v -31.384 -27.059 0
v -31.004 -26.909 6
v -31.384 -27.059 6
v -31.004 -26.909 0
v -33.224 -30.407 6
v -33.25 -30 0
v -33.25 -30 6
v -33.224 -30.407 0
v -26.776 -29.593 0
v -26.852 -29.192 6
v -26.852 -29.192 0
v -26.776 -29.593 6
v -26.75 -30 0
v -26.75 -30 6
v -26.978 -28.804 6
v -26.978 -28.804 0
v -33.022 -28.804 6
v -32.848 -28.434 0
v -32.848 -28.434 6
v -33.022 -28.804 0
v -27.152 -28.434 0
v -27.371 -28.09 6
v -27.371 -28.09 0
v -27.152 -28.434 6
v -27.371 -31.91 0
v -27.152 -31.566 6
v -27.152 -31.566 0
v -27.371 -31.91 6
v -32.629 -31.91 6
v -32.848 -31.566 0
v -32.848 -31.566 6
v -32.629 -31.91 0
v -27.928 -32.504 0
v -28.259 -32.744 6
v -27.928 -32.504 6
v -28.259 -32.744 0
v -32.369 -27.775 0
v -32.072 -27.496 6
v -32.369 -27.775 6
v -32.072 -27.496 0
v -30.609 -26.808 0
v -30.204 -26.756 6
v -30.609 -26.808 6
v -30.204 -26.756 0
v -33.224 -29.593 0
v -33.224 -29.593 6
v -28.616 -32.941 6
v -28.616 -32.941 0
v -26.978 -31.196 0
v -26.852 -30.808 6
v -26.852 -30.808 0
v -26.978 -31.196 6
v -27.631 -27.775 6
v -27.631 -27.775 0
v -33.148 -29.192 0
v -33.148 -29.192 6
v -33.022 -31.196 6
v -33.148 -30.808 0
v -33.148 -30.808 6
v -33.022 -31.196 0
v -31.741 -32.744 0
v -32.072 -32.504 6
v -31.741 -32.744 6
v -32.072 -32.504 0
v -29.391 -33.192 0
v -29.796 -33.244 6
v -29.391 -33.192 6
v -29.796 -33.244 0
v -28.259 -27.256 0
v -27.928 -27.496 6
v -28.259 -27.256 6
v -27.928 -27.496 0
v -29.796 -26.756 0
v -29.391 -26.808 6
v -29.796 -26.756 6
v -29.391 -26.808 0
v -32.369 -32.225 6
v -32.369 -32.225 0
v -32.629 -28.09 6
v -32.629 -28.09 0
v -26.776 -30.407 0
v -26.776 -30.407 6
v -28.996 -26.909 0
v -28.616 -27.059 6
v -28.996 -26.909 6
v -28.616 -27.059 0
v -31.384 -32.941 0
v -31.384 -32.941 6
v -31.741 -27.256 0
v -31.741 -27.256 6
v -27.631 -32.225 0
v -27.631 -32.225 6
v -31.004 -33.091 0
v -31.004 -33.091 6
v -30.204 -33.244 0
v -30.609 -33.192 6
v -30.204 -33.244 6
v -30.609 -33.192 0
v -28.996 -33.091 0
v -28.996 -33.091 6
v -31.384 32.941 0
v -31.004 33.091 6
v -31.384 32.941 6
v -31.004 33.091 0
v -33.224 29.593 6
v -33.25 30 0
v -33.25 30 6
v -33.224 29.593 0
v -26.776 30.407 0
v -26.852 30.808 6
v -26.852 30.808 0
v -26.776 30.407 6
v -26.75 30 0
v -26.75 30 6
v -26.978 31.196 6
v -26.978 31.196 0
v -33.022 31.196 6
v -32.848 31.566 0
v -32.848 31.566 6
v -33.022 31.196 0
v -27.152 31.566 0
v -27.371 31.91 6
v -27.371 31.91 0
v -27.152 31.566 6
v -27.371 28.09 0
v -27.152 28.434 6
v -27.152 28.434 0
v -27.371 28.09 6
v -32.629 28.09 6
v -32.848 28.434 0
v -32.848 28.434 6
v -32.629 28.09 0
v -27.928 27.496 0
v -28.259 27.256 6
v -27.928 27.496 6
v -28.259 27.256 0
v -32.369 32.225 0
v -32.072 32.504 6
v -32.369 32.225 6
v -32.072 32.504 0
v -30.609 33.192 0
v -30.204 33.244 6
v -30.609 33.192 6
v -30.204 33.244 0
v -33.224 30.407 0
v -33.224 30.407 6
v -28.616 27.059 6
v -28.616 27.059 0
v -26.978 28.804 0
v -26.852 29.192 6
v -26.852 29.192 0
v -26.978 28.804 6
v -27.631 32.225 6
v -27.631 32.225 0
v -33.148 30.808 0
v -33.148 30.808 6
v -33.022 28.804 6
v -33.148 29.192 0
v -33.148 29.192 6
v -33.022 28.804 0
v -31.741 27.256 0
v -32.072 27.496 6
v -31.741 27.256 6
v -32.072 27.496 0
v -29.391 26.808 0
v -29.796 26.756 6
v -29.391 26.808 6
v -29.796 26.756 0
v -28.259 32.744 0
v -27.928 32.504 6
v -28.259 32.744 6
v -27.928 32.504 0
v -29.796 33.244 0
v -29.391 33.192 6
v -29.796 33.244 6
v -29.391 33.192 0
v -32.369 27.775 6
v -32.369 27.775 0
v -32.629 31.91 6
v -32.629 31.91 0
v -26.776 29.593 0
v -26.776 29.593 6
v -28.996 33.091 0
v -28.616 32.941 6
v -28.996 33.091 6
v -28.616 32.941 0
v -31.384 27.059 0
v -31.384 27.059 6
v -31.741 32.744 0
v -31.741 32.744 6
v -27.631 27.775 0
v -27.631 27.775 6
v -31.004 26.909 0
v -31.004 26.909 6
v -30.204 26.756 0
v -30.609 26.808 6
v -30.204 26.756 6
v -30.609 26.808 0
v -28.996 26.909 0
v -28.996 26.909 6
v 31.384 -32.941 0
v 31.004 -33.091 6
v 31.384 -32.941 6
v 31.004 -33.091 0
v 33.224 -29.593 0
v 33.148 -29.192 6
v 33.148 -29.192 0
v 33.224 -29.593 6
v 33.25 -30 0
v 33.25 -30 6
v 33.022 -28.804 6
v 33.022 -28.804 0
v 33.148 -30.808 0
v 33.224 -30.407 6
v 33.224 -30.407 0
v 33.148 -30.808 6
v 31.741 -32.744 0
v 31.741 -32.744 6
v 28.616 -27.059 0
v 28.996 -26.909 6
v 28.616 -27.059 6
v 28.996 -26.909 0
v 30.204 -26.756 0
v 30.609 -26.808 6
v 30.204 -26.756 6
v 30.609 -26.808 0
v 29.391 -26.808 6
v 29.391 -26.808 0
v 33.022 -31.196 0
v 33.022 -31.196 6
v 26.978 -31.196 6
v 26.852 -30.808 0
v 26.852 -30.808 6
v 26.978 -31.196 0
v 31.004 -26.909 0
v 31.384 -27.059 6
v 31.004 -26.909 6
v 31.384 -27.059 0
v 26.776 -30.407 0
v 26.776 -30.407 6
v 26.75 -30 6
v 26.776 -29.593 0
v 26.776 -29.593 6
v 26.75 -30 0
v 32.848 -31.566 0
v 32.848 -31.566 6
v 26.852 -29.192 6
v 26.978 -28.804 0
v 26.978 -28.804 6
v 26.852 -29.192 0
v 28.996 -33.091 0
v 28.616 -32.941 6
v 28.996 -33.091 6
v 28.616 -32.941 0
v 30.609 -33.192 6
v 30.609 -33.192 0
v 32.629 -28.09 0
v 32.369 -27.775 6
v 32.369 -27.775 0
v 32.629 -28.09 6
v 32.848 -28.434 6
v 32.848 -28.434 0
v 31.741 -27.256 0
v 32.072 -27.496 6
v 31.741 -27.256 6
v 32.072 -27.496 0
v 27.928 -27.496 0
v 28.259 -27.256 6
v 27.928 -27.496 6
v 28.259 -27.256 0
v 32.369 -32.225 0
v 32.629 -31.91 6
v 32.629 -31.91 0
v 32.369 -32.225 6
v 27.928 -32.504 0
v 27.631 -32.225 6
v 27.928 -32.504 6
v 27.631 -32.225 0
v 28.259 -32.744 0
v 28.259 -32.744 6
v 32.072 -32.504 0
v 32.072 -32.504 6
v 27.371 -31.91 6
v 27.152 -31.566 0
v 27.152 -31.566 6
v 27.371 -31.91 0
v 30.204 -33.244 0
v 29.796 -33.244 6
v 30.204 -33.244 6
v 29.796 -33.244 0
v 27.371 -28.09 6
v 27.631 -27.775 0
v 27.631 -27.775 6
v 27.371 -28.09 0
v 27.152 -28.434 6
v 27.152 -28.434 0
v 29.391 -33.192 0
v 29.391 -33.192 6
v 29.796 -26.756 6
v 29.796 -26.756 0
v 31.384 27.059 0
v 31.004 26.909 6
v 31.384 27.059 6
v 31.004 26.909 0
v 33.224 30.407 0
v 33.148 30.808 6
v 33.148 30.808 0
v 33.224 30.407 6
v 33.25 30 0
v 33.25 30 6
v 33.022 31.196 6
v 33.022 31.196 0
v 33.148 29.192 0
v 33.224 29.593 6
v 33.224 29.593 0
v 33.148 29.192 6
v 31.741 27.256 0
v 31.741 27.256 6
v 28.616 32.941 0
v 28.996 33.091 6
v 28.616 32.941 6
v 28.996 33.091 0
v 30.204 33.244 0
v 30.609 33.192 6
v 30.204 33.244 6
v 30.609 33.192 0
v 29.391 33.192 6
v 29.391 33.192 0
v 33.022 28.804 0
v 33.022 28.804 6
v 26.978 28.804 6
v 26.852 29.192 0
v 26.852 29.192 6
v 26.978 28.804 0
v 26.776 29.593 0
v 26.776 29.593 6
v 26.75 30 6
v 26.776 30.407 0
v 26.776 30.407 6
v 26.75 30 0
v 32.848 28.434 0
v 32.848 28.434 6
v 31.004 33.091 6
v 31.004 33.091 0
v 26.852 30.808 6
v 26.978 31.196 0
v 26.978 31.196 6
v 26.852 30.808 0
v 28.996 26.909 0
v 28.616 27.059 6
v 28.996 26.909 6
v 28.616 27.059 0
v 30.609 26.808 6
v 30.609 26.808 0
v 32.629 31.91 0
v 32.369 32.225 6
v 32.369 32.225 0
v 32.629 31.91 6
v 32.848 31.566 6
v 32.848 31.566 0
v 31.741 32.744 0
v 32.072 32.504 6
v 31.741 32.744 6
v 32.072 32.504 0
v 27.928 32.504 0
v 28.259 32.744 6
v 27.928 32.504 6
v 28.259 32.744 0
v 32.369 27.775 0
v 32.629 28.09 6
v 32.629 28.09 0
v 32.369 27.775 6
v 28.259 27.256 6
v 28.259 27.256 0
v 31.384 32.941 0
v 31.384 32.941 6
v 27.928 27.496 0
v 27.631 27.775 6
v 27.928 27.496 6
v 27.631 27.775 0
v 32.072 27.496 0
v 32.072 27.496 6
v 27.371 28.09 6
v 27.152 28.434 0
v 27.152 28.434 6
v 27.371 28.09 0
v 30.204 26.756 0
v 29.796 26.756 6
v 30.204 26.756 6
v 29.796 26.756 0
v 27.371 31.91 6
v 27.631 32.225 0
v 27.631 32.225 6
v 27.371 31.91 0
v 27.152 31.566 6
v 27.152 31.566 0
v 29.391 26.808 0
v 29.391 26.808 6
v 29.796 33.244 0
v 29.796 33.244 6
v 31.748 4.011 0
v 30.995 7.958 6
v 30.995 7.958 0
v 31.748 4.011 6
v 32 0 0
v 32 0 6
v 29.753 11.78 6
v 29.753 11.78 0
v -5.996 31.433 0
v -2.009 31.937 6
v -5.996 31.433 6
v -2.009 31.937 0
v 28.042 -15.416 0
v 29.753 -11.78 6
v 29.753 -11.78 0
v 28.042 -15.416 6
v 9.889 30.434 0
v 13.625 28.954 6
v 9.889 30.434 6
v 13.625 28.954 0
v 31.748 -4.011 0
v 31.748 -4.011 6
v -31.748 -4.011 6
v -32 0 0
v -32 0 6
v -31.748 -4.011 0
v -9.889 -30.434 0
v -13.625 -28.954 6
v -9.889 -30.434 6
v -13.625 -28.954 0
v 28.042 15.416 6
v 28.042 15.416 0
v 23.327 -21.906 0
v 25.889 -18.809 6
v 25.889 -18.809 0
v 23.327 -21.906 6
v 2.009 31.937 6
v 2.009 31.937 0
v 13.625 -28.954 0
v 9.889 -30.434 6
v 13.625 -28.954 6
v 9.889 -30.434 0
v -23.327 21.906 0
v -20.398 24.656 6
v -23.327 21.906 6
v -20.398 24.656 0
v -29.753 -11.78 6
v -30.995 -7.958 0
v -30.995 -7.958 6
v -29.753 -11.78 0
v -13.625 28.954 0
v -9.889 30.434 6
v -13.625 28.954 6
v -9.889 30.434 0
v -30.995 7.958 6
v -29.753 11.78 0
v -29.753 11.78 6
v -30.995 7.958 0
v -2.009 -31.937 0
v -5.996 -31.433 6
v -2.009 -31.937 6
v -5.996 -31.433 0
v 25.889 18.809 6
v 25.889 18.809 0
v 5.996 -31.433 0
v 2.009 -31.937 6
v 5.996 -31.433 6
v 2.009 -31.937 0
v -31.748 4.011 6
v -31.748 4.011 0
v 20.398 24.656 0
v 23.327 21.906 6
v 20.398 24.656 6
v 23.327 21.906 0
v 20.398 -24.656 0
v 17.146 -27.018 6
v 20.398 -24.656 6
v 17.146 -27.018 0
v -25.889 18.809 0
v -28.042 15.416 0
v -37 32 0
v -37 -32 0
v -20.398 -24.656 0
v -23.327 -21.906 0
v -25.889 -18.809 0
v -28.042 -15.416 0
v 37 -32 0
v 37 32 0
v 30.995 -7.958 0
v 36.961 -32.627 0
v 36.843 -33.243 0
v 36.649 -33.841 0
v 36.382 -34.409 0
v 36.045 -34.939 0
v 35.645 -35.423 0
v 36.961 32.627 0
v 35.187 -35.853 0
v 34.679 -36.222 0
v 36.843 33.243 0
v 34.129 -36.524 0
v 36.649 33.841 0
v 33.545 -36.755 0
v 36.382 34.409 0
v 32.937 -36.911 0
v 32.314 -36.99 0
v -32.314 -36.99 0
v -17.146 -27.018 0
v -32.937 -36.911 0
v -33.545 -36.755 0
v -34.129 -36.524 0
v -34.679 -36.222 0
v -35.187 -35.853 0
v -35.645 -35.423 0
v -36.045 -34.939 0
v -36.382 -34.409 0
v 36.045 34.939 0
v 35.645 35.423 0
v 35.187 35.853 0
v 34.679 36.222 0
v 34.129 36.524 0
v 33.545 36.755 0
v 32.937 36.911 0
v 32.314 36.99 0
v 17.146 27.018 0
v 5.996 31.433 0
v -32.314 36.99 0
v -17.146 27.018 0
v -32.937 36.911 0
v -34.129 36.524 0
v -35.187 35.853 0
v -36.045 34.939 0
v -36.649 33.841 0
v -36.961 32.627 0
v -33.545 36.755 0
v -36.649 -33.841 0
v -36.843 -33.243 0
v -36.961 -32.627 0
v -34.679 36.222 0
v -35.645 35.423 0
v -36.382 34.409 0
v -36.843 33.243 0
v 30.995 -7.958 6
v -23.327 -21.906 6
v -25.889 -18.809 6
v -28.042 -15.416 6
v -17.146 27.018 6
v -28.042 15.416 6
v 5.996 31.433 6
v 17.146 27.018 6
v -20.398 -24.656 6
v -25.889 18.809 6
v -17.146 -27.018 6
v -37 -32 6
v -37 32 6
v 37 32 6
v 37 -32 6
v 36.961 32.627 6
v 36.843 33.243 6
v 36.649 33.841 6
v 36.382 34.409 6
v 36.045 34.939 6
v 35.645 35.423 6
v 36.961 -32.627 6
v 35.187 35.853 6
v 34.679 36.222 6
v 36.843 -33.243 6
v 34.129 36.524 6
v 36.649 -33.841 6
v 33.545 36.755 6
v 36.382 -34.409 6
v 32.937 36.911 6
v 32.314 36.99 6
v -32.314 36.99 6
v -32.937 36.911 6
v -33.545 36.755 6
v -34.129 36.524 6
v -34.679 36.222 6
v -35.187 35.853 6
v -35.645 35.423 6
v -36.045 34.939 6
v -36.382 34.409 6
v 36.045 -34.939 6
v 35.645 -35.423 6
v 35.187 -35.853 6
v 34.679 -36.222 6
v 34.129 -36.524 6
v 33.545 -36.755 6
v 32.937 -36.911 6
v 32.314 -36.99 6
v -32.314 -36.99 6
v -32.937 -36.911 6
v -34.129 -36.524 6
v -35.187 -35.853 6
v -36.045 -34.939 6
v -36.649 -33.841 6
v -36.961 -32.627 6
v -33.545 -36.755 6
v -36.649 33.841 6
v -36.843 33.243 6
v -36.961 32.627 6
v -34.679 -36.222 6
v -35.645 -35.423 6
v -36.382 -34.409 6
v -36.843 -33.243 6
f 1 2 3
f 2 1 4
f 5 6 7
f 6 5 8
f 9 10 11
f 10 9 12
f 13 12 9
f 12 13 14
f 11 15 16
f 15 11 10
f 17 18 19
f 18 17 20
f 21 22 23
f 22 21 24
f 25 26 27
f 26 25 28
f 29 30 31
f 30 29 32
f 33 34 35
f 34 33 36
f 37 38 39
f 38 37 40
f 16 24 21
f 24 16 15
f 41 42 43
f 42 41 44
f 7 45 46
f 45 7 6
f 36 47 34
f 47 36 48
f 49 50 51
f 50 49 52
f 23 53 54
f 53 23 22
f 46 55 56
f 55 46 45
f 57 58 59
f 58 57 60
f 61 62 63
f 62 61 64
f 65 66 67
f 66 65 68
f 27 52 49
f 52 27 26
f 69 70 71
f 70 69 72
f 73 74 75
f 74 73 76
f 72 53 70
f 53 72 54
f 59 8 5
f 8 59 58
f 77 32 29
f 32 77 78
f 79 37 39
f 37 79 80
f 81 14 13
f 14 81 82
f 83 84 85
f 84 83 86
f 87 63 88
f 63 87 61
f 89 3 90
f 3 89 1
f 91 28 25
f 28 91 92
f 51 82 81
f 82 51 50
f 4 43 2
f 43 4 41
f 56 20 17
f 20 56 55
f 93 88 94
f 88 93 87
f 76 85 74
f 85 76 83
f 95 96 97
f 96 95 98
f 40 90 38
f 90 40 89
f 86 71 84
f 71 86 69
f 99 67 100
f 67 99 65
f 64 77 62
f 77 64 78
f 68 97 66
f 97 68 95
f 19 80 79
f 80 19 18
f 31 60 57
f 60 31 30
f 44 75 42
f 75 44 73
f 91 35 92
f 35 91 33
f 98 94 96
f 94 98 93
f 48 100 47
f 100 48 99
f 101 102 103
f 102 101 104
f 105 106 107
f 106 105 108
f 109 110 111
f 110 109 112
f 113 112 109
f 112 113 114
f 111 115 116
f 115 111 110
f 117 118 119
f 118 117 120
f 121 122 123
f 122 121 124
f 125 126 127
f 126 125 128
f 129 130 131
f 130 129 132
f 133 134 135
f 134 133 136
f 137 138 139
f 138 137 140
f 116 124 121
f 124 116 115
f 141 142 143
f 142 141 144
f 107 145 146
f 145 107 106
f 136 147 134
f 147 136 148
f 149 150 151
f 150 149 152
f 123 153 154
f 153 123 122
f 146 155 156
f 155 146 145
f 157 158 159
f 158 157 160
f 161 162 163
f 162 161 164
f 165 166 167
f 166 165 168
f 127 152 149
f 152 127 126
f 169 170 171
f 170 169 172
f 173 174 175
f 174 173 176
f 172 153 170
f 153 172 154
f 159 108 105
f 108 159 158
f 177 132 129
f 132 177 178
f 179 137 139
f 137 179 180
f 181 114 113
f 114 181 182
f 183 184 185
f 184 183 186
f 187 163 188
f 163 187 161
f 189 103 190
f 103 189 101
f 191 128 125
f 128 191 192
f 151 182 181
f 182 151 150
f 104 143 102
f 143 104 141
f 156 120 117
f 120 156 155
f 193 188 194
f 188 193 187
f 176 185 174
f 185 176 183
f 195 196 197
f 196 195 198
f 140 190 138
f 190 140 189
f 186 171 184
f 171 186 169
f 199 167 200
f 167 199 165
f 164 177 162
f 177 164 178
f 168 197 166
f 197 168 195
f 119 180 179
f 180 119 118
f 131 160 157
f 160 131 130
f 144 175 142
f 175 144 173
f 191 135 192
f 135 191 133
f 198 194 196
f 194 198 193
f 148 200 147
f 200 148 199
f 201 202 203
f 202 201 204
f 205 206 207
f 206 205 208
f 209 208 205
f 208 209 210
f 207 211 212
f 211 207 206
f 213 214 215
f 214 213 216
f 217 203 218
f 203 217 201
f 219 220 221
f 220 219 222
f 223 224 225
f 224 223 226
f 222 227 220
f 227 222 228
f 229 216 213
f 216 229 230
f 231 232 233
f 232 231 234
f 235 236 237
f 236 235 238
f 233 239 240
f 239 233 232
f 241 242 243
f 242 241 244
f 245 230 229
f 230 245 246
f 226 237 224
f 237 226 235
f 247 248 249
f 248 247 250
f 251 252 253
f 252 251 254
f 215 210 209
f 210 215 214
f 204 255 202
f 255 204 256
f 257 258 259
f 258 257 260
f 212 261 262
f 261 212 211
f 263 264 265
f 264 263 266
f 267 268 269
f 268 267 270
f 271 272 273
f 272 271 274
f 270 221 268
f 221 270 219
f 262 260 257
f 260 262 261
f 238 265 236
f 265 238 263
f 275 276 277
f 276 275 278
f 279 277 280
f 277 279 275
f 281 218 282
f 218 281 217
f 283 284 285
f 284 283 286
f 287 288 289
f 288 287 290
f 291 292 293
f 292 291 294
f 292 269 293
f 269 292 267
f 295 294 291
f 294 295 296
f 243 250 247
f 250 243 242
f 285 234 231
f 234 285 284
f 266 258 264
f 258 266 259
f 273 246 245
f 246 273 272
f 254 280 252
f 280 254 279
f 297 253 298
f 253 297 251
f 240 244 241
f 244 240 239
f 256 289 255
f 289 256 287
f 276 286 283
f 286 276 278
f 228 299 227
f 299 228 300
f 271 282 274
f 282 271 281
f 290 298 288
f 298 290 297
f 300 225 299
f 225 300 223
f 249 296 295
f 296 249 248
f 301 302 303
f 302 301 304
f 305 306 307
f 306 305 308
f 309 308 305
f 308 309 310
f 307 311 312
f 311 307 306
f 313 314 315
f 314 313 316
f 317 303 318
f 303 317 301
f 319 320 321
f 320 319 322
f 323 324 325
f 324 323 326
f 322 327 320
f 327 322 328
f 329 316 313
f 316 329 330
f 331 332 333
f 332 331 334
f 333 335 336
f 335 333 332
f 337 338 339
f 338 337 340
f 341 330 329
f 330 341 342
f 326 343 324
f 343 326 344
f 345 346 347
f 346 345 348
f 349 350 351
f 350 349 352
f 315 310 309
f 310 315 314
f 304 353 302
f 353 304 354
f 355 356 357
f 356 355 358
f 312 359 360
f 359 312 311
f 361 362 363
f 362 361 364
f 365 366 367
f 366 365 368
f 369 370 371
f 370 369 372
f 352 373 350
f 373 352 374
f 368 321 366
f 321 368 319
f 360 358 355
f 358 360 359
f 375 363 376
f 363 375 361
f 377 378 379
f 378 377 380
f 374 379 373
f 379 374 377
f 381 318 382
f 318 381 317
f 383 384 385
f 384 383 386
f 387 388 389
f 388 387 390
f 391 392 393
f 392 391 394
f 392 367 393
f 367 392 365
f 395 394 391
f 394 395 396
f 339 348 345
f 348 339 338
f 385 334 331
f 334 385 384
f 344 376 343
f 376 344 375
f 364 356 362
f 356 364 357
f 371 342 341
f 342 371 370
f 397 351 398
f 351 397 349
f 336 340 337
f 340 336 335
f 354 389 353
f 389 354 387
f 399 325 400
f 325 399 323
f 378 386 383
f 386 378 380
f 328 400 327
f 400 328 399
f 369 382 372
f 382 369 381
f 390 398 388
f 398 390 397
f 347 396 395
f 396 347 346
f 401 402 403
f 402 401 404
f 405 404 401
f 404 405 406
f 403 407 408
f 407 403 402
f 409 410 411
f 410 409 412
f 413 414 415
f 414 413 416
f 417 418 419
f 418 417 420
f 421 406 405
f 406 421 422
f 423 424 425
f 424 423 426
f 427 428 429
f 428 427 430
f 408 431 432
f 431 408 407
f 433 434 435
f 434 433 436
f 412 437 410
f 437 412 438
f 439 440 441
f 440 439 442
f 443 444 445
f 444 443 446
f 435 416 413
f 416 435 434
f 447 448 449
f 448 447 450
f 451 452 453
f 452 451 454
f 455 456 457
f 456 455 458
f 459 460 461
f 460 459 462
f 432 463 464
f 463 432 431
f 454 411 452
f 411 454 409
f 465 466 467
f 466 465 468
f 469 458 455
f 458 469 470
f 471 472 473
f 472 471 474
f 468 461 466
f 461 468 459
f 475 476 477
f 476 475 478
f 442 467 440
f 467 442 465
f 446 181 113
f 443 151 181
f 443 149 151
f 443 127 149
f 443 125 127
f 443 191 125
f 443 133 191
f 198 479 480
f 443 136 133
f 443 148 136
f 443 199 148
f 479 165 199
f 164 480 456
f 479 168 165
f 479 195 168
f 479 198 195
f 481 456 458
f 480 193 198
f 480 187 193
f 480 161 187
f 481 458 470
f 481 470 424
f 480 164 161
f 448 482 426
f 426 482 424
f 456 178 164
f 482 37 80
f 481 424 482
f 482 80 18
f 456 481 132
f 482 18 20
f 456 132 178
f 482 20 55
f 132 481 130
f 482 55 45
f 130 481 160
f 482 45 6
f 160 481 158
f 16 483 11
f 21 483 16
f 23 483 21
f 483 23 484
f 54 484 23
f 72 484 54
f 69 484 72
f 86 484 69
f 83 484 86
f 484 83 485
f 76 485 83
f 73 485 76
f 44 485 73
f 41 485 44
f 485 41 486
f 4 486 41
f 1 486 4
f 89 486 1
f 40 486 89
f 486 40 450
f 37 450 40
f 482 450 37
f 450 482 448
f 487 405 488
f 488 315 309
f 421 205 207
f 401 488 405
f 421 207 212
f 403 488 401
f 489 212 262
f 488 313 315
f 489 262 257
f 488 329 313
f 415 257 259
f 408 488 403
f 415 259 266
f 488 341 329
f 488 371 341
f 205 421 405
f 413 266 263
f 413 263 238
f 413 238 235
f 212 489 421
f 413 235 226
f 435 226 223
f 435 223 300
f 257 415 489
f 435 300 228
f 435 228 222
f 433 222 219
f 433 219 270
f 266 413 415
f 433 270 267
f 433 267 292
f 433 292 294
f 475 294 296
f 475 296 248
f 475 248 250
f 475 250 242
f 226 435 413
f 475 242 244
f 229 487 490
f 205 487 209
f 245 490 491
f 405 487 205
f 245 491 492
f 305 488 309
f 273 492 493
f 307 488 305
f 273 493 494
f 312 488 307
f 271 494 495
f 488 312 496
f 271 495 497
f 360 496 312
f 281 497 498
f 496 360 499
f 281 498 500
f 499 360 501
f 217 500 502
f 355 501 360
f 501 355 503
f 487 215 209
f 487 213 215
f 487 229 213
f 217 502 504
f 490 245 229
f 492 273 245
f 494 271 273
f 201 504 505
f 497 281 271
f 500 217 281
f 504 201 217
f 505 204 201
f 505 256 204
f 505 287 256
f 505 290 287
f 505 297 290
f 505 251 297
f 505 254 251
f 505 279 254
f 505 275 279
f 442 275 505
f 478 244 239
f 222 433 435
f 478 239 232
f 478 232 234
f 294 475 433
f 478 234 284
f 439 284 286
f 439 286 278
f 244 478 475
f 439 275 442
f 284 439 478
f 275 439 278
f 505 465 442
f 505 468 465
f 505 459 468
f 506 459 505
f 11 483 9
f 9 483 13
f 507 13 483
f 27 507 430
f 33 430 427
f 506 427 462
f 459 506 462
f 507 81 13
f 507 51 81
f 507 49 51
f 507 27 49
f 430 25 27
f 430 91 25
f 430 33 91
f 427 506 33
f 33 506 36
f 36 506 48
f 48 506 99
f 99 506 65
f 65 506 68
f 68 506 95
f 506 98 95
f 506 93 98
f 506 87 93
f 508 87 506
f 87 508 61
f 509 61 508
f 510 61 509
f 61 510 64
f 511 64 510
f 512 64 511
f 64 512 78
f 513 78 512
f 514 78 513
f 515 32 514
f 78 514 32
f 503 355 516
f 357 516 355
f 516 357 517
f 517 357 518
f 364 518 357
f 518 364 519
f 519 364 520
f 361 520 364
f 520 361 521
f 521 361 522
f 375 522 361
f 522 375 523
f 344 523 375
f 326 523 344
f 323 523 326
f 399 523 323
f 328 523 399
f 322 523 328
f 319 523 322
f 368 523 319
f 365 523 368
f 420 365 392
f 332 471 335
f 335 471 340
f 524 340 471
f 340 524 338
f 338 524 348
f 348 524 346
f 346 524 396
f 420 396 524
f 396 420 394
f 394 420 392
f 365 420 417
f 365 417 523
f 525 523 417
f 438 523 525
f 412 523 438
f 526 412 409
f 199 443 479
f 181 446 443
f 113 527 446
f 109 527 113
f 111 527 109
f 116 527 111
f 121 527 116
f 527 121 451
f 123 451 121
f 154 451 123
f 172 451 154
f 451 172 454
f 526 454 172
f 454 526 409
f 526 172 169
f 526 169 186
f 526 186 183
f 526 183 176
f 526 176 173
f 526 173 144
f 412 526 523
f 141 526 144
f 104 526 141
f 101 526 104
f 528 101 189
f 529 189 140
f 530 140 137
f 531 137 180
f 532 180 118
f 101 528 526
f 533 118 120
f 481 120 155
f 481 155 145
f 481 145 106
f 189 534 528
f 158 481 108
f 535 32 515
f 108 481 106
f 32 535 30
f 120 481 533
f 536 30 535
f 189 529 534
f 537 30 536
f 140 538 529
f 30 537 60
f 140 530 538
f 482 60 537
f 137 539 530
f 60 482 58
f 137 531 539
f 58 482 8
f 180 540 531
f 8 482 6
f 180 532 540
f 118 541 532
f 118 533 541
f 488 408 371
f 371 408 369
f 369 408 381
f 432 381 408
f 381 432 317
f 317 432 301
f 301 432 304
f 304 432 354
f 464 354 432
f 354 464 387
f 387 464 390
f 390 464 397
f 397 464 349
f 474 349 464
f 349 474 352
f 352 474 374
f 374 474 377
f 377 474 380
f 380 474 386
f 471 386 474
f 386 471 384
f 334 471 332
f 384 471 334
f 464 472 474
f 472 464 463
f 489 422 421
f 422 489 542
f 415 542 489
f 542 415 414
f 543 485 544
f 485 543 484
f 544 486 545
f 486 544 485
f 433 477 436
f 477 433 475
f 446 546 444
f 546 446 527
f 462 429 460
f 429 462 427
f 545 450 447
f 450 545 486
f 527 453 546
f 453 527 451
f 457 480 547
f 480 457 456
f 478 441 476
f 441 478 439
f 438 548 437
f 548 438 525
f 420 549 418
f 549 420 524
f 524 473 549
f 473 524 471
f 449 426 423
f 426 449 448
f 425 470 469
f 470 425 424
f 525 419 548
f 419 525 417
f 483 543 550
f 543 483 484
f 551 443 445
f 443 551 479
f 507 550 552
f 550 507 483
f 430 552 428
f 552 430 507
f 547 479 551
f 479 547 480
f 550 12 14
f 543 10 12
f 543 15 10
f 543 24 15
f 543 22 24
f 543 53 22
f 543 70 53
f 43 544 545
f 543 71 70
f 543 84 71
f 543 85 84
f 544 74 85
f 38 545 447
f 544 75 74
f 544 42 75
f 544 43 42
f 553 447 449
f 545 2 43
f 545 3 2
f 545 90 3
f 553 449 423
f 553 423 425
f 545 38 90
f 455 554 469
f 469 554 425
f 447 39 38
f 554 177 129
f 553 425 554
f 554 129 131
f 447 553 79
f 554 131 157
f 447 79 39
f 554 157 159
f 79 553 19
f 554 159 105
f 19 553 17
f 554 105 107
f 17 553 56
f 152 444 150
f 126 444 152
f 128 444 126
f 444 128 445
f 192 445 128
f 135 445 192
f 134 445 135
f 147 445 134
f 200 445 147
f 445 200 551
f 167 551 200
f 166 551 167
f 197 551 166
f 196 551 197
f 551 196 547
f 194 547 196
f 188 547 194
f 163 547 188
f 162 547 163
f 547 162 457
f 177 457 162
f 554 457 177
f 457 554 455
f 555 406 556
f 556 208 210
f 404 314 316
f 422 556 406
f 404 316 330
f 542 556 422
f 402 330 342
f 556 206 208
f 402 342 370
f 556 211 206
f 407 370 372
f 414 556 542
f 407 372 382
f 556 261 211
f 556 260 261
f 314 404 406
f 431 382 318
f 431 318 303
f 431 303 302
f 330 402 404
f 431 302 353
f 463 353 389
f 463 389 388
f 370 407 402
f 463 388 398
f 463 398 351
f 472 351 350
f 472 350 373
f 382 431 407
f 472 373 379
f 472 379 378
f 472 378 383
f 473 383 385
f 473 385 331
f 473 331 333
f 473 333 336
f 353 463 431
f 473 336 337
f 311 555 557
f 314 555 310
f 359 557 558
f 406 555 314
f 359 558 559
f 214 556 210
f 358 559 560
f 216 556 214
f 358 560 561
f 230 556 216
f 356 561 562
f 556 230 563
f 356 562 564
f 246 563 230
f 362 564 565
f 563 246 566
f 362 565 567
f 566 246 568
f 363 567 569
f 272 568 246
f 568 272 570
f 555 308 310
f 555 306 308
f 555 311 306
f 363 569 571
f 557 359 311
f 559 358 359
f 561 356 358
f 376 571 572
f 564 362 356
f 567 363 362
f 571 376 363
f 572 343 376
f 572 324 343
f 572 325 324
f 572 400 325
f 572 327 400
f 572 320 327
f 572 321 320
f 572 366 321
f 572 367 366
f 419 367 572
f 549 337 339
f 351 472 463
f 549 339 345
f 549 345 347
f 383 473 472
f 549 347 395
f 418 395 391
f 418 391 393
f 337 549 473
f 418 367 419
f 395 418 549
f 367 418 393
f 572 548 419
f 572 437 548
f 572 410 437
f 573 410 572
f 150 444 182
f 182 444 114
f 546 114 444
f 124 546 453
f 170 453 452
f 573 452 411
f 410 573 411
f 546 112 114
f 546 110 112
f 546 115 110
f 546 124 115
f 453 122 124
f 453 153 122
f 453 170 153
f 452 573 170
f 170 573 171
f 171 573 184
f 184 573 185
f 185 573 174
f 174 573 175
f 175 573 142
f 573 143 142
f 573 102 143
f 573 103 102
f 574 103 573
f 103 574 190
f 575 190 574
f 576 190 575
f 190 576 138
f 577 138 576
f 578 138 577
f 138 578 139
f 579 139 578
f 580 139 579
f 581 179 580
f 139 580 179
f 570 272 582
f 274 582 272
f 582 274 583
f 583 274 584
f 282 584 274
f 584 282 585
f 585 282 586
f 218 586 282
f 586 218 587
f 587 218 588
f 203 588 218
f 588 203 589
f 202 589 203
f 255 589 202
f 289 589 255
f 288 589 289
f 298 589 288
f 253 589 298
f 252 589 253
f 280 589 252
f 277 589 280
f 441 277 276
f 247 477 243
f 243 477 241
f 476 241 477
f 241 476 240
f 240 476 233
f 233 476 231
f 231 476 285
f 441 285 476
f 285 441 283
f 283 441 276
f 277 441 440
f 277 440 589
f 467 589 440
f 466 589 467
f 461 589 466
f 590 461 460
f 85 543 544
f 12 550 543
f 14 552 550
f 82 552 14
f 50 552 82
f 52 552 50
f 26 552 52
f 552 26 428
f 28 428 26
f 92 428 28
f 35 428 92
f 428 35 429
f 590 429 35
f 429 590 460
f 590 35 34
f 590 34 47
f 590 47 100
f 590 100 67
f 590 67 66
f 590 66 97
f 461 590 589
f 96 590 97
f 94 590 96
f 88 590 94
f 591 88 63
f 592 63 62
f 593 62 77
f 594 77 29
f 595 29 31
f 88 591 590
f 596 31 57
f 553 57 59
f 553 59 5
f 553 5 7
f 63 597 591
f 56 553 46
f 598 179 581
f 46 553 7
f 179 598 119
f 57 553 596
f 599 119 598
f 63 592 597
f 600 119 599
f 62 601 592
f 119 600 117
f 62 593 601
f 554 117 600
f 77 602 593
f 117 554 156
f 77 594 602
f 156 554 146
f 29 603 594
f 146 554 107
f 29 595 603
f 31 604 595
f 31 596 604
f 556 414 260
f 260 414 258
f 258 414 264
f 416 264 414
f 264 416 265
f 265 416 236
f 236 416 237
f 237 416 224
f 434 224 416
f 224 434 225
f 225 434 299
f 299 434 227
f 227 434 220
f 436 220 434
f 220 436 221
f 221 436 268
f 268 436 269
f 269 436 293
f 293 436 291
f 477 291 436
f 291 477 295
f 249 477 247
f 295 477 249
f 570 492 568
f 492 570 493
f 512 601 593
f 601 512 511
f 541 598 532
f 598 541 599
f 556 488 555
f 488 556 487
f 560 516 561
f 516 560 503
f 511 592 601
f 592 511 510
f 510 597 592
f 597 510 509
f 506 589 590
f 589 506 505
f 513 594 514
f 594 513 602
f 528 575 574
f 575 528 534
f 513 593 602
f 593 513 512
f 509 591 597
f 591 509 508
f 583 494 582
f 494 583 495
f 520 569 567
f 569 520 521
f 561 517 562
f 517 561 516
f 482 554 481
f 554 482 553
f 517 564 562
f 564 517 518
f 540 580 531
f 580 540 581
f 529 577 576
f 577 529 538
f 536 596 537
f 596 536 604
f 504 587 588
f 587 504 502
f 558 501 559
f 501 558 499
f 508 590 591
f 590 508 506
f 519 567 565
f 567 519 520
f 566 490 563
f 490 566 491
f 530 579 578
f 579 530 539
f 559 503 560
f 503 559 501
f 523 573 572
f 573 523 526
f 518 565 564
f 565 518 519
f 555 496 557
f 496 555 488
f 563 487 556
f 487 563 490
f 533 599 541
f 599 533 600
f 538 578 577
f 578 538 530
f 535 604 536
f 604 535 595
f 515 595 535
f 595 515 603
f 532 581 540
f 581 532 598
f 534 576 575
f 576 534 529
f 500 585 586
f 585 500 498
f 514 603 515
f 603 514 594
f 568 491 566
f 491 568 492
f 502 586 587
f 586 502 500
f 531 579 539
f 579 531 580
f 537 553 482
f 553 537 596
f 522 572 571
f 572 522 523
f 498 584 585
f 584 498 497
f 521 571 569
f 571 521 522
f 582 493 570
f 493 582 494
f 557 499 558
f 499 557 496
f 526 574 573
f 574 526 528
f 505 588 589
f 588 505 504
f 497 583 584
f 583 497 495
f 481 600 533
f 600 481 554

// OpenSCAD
$fn = 50;

difference() {
	union() {
		hull() {
			translate(v = [-32.0, 32.0, 0]) {
				cylinder(h = 6, r = 5);
			}
			translate(v = [32.0, 32.0, 0]) {
				cylinder(h = 6, r = 5);
			}
			translate(v = [-32.0, -32.0, 0]) {
				cylinder(h = 6, r = 5);
			}
			translate(v = [32.0, -32.0, 0]) {
				cylinder(h = 6, r = 5);
			}
		}
	}
	union() {
		translate(v = [-30.0, -30.0, -100.0]) {
			cylinder(h = 200, r = 3.25);
		}
		translate(v = [-30.0, 30.0, -100.0]) {
			cylinder(h = 200, r = 3.25);
		}
		translate(v = [30.0, -30.0, -100.0]) {
			cylinder(h = 200, r = 3.25);
		}
		translate(v = [30.0, 30.0, -100.0]) {
			cylinder(h = 200, r = 3.25);
		}
		translate(v = [-30.0, -30.0, -100.0]) {
			cylinder(h = 200, r = 1.8);
		}
		translate(v = [-30.0, 30.0, -100.0]) {
			cylinder(h = 200, r = 1.8);
		}
		translate(v = [30.0, -30.0, -100.0]) {
			cylinder(h = 200, r = 1.8);
		}
		translate(v = [30.0, 30.0, -100.0]) {
			cylinder(h = 200, r = 1.8);
		}
		cylinder(h = 6, r = 32.0);
	}
}
